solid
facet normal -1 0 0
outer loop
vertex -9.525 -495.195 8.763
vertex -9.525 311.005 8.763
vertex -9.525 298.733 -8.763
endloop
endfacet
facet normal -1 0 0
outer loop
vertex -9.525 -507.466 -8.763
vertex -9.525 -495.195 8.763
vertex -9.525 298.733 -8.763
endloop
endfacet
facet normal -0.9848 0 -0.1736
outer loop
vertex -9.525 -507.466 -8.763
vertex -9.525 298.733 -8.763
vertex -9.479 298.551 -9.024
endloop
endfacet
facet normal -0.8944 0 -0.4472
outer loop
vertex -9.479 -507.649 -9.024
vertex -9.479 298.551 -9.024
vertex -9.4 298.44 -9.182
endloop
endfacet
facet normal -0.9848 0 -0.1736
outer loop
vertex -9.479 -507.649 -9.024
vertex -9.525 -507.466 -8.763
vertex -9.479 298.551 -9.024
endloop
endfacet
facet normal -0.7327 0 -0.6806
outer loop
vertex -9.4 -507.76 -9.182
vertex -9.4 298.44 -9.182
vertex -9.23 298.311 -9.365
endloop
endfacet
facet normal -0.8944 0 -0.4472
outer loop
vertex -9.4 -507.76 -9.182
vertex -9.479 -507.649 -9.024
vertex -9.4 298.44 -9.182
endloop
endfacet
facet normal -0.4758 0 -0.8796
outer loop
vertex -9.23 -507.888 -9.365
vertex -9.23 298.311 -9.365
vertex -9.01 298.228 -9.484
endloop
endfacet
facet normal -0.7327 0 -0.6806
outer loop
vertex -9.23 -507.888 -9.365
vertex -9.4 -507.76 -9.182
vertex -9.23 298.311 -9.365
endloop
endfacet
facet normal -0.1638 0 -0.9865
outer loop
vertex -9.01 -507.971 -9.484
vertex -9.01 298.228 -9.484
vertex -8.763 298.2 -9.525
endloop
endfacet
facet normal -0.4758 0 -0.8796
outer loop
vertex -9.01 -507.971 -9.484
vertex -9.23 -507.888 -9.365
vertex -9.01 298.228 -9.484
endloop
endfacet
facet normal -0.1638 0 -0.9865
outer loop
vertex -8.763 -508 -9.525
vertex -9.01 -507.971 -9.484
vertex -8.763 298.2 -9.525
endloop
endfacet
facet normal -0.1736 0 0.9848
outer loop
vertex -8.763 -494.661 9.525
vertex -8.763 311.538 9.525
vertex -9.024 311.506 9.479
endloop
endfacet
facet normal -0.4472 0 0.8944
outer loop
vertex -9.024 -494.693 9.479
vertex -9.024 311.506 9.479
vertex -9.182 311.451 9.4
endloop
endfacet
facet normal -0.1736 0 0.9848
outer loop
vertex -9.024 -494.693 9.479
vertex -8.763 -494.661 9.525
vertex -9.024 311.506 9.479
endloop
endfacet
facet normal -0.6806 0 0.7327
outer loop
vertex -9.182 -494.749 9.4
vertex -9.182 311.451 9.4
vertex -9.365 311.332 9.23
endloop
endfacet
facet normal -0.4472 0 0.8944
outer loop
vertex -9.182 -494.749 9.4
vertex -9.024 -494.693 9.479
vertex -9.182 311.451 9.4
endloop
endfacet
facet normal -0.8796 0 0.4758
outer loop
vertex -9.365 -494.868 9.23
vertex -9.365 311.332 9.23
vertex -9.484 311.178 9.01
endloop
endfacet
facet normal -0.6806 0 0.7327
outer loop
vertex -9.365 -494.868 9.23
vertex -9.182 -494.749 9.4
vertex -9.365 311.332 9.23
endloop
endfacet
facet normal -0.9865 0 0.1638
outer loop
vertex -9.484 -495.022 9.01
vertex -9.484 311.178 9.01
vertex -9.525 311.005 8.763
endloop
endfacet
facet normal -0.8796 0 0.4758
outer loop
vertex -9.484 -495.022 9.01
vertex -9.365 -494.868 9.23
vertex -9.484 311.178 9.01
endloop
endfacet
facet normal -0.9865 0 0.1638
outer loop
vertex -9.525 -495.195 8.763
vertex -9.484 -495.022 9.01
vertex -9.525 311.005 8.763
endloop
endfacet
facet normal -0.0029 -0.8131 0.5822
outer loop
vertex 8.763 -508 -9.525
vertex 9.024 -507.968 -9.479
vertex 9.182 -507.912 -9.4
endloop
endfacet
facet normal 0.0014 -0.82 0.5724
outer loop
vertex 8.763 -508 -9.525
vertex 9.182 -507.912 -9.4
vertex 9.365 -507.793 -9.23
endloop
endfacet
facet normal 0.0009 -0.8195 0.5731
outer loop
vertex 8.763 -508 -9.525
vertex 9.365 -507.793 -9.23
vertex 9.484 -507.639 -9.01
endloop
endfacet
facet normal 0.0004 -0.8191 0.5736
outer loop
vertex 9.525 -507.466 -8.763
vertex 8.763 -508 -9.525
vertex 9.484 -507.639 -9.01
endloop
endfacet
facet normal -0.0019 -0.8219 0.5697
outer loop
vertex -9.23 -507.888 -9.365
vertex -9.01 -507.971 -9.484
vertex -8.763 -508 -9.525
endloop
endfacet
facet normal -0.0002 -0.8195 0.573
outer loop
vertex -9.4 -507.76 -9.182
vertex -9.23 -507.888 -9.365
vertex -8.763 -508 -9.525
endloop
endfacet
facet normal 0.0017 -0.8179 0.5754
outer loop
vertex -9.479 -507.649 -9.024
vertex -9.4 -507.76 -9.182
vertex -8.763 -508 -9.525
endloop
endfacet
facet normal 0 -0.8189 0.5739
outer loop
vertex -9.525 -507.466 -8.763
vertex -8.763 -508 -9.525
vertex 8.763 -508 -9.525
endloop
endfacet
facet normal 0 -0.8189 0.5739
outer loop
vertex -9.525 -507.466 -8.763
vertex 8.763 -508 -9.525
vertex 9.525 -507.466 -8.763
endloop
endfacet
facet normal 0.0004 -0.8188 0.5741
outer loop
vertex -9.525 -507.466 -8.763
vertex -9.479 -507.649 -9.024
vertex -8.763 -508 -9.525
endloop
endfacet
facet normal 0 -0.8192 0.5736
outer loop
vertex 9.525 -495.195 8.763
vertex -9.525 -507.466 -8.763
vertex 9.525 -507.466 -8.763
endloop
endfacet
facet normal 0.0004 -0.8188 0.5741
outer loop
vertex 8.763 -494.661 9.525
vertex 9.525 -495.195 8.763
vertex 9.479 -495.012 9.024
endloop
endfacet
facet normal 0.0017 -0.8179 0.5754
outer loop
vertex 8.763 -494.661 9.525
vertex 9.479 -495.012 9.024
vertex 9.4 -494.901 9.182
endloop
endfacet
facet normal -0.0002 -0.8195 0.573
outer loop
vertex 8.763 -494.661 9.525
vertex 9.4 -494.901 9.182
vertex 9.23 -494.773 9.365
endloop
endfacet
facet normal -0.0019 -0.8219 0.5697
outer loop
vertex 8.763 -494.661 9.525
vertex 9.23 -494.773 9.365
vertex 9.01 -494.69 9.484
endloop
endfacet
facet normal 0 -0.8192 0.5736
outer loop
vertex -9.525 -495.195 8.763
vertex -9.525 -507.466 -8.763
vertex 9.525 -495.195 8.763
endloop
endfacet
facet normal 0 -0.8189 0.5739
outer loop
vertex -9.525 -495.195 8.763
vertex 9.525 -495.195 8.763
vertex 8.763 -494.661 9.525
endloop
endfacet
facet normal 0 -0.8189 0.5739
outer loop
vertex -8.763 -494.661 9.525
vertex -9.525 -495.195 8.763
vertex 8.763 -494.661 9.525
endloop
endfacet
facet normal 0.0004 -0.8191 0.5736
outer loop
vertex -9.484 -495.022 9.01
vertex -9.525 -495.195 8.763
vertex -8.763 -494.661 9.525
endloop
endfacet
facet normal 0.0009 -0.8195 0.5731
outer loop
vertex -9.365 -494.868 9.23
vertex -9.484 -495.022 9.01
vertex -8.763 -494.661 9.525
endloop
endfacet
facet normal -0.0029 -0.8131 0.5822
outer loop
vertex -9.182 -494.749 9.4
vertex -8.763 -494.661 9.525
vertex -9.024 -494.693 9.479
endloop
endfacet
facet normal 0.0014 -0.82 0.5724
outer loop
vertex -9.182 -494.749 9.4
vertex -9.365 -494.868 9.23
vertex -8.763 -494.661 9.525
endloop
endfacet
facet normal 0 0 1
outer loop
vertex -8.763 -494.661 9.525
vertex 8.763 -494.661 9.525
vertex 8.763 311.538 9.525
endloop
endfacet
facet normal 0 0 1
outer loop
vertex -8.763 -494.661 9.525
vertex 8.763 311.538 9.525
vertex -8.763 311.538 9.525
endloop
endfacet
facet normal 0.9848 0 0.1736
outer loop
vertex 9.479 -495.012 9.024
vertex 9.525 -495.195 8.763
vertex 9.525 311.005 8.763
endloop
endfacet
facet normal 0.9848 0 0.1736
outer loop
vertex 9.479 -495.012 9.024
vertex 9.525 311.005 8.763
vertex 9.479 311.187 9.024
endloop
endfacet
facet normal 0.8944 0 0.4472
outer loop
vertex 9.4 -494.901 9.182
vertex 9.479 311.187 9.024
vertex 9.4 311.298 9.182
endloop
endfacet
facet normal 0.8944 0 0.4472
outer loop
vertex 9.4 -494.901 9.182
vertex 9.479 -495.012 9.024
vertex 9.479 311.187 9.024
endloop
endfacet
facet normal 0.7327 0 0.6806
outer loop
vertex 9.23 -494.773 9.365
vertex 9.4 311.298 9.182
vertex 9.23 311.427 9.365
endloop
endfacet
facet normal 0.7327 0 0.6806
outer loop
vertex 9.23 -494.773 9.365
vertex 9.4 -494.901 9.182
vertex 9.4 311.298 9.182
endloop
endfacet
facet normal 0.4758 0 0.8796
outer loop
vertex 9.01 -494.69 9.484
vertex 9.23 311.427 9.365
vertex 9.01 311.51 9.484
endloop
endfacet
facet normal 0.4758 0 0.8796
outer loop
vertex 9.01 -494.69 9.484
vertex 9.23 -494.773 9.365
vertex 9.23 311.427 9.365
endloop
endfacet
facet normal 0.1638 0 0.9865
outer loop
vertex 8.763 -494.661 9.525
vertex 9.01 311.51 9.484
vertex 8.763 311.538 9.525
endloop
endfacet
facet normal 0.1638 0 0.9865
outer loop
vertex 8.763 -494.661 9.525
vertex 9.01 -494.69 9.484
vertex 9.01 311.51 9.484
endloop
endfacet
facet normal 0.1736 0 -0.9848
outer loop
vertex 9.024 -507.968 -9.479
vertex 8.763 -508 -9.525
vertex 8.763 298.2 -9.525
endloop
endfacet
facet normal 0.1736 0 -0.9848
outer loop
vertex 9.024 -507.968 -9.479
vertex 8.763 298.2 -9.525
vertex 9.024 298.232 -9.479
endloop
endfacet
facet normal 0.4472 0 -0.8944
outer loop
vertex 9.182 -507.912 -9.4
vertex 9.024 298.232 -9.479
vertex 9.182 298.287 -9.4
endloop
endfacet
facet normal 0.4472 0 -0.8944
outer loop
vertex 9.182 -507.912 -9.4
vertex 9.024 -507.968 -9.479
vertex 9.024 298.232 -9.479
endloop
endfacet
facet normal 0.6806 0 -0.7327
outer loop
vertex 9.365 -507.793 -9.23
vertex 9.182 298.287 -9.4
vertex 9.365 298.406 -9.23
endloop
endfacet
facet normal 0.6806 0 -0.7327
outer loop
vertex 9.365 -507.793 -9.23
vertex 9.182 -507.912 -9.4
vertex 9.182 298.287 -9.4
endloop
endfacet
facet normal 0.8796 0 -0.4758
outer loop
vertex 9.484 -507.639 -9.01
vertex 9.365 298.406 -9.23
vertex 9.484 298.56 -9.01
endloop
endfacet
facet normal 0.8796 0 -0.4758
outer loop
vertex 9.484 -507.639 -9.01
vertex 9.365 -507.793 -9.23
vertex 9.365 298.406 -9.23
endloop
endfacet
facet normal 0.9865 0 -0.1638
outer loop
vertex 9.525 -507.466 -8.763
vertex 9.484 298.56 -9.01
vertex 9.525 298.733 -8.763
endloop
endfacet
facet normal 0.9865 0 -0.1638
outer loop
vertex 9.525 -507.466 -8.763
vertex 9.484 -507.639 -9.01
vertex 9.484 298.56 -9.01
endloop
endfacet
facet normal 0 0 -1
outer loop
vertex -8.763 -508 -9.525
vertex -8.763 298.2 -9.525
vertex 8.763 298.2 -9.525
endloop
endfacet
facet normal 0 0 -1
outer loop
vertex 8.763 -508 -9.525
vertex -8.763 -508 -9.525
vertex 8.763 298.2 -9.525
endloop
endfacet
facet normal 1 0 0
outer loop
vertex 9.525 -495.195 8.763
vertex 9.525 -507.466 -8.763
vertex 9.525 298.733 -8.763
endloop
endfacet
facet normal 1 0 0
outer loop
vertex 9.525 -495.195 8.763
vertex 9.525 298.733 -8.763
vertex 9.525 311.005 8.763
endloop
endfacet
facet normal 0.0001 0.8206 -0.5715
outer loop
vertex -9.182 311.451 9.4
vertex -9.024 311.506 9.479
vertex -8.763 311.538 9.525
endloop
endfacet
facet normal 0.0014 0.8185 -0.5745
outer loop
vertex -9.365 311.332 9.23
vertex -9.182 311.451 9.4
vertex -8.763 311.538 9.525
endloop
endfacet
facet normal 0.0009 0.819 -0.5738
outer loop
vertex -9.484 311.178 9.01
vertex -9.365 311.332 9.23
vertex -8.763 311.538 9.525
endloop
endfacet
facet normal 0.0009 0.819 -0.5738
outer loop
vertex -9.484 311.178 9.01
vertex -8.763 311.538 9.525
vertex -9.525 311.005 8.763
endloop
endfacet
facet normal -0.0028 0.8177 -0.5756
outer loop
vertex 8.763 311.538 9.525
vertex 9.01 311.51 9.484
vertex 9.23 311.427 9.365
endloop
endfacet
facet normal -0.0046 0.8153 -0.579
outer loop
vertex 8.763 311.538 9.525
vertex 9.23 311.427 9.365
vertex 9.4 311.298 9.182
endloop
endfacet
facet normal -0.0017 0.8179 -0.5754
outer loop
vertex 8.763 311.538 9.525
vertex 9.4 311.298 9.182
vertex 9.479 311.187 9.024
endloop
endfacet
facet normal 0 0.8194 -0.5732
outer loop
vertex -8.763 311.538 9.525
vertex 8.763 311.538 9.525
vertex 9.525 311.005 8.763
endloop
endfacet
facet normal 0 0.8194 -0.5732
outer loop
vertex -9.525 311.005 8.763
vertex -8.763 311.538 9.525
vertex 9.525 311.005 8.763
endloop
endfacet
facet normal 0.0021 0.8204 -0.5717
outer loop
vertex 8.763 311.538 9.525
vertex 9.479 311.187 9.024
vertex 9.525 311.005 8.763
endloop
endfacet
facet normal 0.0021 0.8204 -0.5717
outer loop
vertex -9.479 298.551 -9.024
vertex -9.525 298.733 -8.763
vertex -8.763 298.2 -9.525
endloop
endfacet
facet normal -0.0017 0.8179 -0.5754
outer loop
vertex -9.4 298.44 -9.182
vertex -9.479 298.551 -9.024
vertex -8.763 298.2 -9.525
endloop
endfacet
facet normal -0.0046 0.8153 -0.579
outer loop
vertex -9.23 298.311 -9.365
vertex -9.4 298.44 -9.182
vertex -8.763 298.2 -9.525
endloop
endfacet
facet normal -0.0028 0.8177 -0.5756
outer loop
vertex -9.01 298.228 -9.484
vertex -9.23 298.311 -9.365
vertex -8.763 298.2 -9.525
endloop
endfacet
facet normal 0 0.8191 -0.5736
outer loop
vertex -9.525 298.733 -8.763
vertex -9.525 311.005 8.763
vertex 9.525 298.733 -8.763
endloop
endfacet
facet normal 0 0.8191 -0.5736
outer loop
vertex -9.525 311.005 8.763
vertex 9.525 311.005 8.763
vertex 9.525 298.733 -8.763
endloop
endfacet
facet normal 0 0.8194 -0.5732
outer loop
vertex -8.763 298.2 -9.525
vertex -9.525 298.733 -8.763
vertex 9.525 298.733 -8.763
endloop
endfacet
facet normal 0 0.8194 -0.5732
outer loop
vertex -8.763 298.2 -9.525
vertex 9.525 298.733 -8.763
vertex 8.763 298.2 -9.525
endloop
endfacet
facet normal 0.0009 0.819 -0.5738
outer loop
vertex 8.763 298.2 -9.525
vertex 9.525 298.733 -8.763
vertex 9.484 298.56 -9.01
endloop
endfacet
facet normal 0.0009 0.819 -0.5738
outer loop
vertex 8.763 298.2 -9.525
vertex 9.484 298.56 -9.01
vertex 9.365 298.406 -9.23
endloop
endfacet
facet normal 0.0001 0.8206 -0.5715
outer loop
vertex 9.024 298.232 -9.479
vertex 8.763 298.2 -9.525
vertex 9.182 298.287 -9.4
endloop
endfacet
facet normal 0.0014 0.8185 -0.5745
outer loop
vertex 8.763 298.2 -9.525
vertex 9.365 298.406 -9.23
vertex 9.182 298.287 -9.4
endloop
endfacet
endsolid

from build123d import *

# Parameters (mm, degrees)
F1_DEPTH = 508
F3_DEPTH = 25.4


with BuildPart() as f1:
    # F0 (on Front) → F1 (new body, symmetric)
    with BuildSketch(Plane.XZ):
        with BuildLine():
            Line((8.763, 9.525), (-8.763, 9.525))
            ThreePointArc((-8.763, 9.525), (-9.301815, 9.301815), (-9.525, 8.763))
            Line((-9.525, 8.763), (-9.525, -8.763))
            ThreePointArc((-9.525, -8.763), (-9.301815, -9.301815), (-8.763, -9.525))
            Line((-8.763, -9.525), (8.763, -9.525))
            ThreePointArc((8.763, -9.525), (9.301815, -9.301815), (9.525, -8.763))
            Line((9.525, -8.763), (9.525, 8.763))
            ThreePointArc((9.525, 8.763), (9.301815, 9.301815), (8.763, 9.525))
        make_face()
    extrude(amount=F1_DEPTH, both=True)

    # F2 (on Right) → F3 (cut, symmetric)
    with BuildSketch(Plane.YZ):
        Polygon((-508, 24.218117), (-508, -9.525), (-484.372815, 24.218117), align=None)
        Polygon((508, -9.525), (508, 290.101111), (298.199538, -9.525), align=None)
    extrude(amount=F3_DEPTH, both=True, mode=Mode.SUBTRACT)


solid = f1.part
